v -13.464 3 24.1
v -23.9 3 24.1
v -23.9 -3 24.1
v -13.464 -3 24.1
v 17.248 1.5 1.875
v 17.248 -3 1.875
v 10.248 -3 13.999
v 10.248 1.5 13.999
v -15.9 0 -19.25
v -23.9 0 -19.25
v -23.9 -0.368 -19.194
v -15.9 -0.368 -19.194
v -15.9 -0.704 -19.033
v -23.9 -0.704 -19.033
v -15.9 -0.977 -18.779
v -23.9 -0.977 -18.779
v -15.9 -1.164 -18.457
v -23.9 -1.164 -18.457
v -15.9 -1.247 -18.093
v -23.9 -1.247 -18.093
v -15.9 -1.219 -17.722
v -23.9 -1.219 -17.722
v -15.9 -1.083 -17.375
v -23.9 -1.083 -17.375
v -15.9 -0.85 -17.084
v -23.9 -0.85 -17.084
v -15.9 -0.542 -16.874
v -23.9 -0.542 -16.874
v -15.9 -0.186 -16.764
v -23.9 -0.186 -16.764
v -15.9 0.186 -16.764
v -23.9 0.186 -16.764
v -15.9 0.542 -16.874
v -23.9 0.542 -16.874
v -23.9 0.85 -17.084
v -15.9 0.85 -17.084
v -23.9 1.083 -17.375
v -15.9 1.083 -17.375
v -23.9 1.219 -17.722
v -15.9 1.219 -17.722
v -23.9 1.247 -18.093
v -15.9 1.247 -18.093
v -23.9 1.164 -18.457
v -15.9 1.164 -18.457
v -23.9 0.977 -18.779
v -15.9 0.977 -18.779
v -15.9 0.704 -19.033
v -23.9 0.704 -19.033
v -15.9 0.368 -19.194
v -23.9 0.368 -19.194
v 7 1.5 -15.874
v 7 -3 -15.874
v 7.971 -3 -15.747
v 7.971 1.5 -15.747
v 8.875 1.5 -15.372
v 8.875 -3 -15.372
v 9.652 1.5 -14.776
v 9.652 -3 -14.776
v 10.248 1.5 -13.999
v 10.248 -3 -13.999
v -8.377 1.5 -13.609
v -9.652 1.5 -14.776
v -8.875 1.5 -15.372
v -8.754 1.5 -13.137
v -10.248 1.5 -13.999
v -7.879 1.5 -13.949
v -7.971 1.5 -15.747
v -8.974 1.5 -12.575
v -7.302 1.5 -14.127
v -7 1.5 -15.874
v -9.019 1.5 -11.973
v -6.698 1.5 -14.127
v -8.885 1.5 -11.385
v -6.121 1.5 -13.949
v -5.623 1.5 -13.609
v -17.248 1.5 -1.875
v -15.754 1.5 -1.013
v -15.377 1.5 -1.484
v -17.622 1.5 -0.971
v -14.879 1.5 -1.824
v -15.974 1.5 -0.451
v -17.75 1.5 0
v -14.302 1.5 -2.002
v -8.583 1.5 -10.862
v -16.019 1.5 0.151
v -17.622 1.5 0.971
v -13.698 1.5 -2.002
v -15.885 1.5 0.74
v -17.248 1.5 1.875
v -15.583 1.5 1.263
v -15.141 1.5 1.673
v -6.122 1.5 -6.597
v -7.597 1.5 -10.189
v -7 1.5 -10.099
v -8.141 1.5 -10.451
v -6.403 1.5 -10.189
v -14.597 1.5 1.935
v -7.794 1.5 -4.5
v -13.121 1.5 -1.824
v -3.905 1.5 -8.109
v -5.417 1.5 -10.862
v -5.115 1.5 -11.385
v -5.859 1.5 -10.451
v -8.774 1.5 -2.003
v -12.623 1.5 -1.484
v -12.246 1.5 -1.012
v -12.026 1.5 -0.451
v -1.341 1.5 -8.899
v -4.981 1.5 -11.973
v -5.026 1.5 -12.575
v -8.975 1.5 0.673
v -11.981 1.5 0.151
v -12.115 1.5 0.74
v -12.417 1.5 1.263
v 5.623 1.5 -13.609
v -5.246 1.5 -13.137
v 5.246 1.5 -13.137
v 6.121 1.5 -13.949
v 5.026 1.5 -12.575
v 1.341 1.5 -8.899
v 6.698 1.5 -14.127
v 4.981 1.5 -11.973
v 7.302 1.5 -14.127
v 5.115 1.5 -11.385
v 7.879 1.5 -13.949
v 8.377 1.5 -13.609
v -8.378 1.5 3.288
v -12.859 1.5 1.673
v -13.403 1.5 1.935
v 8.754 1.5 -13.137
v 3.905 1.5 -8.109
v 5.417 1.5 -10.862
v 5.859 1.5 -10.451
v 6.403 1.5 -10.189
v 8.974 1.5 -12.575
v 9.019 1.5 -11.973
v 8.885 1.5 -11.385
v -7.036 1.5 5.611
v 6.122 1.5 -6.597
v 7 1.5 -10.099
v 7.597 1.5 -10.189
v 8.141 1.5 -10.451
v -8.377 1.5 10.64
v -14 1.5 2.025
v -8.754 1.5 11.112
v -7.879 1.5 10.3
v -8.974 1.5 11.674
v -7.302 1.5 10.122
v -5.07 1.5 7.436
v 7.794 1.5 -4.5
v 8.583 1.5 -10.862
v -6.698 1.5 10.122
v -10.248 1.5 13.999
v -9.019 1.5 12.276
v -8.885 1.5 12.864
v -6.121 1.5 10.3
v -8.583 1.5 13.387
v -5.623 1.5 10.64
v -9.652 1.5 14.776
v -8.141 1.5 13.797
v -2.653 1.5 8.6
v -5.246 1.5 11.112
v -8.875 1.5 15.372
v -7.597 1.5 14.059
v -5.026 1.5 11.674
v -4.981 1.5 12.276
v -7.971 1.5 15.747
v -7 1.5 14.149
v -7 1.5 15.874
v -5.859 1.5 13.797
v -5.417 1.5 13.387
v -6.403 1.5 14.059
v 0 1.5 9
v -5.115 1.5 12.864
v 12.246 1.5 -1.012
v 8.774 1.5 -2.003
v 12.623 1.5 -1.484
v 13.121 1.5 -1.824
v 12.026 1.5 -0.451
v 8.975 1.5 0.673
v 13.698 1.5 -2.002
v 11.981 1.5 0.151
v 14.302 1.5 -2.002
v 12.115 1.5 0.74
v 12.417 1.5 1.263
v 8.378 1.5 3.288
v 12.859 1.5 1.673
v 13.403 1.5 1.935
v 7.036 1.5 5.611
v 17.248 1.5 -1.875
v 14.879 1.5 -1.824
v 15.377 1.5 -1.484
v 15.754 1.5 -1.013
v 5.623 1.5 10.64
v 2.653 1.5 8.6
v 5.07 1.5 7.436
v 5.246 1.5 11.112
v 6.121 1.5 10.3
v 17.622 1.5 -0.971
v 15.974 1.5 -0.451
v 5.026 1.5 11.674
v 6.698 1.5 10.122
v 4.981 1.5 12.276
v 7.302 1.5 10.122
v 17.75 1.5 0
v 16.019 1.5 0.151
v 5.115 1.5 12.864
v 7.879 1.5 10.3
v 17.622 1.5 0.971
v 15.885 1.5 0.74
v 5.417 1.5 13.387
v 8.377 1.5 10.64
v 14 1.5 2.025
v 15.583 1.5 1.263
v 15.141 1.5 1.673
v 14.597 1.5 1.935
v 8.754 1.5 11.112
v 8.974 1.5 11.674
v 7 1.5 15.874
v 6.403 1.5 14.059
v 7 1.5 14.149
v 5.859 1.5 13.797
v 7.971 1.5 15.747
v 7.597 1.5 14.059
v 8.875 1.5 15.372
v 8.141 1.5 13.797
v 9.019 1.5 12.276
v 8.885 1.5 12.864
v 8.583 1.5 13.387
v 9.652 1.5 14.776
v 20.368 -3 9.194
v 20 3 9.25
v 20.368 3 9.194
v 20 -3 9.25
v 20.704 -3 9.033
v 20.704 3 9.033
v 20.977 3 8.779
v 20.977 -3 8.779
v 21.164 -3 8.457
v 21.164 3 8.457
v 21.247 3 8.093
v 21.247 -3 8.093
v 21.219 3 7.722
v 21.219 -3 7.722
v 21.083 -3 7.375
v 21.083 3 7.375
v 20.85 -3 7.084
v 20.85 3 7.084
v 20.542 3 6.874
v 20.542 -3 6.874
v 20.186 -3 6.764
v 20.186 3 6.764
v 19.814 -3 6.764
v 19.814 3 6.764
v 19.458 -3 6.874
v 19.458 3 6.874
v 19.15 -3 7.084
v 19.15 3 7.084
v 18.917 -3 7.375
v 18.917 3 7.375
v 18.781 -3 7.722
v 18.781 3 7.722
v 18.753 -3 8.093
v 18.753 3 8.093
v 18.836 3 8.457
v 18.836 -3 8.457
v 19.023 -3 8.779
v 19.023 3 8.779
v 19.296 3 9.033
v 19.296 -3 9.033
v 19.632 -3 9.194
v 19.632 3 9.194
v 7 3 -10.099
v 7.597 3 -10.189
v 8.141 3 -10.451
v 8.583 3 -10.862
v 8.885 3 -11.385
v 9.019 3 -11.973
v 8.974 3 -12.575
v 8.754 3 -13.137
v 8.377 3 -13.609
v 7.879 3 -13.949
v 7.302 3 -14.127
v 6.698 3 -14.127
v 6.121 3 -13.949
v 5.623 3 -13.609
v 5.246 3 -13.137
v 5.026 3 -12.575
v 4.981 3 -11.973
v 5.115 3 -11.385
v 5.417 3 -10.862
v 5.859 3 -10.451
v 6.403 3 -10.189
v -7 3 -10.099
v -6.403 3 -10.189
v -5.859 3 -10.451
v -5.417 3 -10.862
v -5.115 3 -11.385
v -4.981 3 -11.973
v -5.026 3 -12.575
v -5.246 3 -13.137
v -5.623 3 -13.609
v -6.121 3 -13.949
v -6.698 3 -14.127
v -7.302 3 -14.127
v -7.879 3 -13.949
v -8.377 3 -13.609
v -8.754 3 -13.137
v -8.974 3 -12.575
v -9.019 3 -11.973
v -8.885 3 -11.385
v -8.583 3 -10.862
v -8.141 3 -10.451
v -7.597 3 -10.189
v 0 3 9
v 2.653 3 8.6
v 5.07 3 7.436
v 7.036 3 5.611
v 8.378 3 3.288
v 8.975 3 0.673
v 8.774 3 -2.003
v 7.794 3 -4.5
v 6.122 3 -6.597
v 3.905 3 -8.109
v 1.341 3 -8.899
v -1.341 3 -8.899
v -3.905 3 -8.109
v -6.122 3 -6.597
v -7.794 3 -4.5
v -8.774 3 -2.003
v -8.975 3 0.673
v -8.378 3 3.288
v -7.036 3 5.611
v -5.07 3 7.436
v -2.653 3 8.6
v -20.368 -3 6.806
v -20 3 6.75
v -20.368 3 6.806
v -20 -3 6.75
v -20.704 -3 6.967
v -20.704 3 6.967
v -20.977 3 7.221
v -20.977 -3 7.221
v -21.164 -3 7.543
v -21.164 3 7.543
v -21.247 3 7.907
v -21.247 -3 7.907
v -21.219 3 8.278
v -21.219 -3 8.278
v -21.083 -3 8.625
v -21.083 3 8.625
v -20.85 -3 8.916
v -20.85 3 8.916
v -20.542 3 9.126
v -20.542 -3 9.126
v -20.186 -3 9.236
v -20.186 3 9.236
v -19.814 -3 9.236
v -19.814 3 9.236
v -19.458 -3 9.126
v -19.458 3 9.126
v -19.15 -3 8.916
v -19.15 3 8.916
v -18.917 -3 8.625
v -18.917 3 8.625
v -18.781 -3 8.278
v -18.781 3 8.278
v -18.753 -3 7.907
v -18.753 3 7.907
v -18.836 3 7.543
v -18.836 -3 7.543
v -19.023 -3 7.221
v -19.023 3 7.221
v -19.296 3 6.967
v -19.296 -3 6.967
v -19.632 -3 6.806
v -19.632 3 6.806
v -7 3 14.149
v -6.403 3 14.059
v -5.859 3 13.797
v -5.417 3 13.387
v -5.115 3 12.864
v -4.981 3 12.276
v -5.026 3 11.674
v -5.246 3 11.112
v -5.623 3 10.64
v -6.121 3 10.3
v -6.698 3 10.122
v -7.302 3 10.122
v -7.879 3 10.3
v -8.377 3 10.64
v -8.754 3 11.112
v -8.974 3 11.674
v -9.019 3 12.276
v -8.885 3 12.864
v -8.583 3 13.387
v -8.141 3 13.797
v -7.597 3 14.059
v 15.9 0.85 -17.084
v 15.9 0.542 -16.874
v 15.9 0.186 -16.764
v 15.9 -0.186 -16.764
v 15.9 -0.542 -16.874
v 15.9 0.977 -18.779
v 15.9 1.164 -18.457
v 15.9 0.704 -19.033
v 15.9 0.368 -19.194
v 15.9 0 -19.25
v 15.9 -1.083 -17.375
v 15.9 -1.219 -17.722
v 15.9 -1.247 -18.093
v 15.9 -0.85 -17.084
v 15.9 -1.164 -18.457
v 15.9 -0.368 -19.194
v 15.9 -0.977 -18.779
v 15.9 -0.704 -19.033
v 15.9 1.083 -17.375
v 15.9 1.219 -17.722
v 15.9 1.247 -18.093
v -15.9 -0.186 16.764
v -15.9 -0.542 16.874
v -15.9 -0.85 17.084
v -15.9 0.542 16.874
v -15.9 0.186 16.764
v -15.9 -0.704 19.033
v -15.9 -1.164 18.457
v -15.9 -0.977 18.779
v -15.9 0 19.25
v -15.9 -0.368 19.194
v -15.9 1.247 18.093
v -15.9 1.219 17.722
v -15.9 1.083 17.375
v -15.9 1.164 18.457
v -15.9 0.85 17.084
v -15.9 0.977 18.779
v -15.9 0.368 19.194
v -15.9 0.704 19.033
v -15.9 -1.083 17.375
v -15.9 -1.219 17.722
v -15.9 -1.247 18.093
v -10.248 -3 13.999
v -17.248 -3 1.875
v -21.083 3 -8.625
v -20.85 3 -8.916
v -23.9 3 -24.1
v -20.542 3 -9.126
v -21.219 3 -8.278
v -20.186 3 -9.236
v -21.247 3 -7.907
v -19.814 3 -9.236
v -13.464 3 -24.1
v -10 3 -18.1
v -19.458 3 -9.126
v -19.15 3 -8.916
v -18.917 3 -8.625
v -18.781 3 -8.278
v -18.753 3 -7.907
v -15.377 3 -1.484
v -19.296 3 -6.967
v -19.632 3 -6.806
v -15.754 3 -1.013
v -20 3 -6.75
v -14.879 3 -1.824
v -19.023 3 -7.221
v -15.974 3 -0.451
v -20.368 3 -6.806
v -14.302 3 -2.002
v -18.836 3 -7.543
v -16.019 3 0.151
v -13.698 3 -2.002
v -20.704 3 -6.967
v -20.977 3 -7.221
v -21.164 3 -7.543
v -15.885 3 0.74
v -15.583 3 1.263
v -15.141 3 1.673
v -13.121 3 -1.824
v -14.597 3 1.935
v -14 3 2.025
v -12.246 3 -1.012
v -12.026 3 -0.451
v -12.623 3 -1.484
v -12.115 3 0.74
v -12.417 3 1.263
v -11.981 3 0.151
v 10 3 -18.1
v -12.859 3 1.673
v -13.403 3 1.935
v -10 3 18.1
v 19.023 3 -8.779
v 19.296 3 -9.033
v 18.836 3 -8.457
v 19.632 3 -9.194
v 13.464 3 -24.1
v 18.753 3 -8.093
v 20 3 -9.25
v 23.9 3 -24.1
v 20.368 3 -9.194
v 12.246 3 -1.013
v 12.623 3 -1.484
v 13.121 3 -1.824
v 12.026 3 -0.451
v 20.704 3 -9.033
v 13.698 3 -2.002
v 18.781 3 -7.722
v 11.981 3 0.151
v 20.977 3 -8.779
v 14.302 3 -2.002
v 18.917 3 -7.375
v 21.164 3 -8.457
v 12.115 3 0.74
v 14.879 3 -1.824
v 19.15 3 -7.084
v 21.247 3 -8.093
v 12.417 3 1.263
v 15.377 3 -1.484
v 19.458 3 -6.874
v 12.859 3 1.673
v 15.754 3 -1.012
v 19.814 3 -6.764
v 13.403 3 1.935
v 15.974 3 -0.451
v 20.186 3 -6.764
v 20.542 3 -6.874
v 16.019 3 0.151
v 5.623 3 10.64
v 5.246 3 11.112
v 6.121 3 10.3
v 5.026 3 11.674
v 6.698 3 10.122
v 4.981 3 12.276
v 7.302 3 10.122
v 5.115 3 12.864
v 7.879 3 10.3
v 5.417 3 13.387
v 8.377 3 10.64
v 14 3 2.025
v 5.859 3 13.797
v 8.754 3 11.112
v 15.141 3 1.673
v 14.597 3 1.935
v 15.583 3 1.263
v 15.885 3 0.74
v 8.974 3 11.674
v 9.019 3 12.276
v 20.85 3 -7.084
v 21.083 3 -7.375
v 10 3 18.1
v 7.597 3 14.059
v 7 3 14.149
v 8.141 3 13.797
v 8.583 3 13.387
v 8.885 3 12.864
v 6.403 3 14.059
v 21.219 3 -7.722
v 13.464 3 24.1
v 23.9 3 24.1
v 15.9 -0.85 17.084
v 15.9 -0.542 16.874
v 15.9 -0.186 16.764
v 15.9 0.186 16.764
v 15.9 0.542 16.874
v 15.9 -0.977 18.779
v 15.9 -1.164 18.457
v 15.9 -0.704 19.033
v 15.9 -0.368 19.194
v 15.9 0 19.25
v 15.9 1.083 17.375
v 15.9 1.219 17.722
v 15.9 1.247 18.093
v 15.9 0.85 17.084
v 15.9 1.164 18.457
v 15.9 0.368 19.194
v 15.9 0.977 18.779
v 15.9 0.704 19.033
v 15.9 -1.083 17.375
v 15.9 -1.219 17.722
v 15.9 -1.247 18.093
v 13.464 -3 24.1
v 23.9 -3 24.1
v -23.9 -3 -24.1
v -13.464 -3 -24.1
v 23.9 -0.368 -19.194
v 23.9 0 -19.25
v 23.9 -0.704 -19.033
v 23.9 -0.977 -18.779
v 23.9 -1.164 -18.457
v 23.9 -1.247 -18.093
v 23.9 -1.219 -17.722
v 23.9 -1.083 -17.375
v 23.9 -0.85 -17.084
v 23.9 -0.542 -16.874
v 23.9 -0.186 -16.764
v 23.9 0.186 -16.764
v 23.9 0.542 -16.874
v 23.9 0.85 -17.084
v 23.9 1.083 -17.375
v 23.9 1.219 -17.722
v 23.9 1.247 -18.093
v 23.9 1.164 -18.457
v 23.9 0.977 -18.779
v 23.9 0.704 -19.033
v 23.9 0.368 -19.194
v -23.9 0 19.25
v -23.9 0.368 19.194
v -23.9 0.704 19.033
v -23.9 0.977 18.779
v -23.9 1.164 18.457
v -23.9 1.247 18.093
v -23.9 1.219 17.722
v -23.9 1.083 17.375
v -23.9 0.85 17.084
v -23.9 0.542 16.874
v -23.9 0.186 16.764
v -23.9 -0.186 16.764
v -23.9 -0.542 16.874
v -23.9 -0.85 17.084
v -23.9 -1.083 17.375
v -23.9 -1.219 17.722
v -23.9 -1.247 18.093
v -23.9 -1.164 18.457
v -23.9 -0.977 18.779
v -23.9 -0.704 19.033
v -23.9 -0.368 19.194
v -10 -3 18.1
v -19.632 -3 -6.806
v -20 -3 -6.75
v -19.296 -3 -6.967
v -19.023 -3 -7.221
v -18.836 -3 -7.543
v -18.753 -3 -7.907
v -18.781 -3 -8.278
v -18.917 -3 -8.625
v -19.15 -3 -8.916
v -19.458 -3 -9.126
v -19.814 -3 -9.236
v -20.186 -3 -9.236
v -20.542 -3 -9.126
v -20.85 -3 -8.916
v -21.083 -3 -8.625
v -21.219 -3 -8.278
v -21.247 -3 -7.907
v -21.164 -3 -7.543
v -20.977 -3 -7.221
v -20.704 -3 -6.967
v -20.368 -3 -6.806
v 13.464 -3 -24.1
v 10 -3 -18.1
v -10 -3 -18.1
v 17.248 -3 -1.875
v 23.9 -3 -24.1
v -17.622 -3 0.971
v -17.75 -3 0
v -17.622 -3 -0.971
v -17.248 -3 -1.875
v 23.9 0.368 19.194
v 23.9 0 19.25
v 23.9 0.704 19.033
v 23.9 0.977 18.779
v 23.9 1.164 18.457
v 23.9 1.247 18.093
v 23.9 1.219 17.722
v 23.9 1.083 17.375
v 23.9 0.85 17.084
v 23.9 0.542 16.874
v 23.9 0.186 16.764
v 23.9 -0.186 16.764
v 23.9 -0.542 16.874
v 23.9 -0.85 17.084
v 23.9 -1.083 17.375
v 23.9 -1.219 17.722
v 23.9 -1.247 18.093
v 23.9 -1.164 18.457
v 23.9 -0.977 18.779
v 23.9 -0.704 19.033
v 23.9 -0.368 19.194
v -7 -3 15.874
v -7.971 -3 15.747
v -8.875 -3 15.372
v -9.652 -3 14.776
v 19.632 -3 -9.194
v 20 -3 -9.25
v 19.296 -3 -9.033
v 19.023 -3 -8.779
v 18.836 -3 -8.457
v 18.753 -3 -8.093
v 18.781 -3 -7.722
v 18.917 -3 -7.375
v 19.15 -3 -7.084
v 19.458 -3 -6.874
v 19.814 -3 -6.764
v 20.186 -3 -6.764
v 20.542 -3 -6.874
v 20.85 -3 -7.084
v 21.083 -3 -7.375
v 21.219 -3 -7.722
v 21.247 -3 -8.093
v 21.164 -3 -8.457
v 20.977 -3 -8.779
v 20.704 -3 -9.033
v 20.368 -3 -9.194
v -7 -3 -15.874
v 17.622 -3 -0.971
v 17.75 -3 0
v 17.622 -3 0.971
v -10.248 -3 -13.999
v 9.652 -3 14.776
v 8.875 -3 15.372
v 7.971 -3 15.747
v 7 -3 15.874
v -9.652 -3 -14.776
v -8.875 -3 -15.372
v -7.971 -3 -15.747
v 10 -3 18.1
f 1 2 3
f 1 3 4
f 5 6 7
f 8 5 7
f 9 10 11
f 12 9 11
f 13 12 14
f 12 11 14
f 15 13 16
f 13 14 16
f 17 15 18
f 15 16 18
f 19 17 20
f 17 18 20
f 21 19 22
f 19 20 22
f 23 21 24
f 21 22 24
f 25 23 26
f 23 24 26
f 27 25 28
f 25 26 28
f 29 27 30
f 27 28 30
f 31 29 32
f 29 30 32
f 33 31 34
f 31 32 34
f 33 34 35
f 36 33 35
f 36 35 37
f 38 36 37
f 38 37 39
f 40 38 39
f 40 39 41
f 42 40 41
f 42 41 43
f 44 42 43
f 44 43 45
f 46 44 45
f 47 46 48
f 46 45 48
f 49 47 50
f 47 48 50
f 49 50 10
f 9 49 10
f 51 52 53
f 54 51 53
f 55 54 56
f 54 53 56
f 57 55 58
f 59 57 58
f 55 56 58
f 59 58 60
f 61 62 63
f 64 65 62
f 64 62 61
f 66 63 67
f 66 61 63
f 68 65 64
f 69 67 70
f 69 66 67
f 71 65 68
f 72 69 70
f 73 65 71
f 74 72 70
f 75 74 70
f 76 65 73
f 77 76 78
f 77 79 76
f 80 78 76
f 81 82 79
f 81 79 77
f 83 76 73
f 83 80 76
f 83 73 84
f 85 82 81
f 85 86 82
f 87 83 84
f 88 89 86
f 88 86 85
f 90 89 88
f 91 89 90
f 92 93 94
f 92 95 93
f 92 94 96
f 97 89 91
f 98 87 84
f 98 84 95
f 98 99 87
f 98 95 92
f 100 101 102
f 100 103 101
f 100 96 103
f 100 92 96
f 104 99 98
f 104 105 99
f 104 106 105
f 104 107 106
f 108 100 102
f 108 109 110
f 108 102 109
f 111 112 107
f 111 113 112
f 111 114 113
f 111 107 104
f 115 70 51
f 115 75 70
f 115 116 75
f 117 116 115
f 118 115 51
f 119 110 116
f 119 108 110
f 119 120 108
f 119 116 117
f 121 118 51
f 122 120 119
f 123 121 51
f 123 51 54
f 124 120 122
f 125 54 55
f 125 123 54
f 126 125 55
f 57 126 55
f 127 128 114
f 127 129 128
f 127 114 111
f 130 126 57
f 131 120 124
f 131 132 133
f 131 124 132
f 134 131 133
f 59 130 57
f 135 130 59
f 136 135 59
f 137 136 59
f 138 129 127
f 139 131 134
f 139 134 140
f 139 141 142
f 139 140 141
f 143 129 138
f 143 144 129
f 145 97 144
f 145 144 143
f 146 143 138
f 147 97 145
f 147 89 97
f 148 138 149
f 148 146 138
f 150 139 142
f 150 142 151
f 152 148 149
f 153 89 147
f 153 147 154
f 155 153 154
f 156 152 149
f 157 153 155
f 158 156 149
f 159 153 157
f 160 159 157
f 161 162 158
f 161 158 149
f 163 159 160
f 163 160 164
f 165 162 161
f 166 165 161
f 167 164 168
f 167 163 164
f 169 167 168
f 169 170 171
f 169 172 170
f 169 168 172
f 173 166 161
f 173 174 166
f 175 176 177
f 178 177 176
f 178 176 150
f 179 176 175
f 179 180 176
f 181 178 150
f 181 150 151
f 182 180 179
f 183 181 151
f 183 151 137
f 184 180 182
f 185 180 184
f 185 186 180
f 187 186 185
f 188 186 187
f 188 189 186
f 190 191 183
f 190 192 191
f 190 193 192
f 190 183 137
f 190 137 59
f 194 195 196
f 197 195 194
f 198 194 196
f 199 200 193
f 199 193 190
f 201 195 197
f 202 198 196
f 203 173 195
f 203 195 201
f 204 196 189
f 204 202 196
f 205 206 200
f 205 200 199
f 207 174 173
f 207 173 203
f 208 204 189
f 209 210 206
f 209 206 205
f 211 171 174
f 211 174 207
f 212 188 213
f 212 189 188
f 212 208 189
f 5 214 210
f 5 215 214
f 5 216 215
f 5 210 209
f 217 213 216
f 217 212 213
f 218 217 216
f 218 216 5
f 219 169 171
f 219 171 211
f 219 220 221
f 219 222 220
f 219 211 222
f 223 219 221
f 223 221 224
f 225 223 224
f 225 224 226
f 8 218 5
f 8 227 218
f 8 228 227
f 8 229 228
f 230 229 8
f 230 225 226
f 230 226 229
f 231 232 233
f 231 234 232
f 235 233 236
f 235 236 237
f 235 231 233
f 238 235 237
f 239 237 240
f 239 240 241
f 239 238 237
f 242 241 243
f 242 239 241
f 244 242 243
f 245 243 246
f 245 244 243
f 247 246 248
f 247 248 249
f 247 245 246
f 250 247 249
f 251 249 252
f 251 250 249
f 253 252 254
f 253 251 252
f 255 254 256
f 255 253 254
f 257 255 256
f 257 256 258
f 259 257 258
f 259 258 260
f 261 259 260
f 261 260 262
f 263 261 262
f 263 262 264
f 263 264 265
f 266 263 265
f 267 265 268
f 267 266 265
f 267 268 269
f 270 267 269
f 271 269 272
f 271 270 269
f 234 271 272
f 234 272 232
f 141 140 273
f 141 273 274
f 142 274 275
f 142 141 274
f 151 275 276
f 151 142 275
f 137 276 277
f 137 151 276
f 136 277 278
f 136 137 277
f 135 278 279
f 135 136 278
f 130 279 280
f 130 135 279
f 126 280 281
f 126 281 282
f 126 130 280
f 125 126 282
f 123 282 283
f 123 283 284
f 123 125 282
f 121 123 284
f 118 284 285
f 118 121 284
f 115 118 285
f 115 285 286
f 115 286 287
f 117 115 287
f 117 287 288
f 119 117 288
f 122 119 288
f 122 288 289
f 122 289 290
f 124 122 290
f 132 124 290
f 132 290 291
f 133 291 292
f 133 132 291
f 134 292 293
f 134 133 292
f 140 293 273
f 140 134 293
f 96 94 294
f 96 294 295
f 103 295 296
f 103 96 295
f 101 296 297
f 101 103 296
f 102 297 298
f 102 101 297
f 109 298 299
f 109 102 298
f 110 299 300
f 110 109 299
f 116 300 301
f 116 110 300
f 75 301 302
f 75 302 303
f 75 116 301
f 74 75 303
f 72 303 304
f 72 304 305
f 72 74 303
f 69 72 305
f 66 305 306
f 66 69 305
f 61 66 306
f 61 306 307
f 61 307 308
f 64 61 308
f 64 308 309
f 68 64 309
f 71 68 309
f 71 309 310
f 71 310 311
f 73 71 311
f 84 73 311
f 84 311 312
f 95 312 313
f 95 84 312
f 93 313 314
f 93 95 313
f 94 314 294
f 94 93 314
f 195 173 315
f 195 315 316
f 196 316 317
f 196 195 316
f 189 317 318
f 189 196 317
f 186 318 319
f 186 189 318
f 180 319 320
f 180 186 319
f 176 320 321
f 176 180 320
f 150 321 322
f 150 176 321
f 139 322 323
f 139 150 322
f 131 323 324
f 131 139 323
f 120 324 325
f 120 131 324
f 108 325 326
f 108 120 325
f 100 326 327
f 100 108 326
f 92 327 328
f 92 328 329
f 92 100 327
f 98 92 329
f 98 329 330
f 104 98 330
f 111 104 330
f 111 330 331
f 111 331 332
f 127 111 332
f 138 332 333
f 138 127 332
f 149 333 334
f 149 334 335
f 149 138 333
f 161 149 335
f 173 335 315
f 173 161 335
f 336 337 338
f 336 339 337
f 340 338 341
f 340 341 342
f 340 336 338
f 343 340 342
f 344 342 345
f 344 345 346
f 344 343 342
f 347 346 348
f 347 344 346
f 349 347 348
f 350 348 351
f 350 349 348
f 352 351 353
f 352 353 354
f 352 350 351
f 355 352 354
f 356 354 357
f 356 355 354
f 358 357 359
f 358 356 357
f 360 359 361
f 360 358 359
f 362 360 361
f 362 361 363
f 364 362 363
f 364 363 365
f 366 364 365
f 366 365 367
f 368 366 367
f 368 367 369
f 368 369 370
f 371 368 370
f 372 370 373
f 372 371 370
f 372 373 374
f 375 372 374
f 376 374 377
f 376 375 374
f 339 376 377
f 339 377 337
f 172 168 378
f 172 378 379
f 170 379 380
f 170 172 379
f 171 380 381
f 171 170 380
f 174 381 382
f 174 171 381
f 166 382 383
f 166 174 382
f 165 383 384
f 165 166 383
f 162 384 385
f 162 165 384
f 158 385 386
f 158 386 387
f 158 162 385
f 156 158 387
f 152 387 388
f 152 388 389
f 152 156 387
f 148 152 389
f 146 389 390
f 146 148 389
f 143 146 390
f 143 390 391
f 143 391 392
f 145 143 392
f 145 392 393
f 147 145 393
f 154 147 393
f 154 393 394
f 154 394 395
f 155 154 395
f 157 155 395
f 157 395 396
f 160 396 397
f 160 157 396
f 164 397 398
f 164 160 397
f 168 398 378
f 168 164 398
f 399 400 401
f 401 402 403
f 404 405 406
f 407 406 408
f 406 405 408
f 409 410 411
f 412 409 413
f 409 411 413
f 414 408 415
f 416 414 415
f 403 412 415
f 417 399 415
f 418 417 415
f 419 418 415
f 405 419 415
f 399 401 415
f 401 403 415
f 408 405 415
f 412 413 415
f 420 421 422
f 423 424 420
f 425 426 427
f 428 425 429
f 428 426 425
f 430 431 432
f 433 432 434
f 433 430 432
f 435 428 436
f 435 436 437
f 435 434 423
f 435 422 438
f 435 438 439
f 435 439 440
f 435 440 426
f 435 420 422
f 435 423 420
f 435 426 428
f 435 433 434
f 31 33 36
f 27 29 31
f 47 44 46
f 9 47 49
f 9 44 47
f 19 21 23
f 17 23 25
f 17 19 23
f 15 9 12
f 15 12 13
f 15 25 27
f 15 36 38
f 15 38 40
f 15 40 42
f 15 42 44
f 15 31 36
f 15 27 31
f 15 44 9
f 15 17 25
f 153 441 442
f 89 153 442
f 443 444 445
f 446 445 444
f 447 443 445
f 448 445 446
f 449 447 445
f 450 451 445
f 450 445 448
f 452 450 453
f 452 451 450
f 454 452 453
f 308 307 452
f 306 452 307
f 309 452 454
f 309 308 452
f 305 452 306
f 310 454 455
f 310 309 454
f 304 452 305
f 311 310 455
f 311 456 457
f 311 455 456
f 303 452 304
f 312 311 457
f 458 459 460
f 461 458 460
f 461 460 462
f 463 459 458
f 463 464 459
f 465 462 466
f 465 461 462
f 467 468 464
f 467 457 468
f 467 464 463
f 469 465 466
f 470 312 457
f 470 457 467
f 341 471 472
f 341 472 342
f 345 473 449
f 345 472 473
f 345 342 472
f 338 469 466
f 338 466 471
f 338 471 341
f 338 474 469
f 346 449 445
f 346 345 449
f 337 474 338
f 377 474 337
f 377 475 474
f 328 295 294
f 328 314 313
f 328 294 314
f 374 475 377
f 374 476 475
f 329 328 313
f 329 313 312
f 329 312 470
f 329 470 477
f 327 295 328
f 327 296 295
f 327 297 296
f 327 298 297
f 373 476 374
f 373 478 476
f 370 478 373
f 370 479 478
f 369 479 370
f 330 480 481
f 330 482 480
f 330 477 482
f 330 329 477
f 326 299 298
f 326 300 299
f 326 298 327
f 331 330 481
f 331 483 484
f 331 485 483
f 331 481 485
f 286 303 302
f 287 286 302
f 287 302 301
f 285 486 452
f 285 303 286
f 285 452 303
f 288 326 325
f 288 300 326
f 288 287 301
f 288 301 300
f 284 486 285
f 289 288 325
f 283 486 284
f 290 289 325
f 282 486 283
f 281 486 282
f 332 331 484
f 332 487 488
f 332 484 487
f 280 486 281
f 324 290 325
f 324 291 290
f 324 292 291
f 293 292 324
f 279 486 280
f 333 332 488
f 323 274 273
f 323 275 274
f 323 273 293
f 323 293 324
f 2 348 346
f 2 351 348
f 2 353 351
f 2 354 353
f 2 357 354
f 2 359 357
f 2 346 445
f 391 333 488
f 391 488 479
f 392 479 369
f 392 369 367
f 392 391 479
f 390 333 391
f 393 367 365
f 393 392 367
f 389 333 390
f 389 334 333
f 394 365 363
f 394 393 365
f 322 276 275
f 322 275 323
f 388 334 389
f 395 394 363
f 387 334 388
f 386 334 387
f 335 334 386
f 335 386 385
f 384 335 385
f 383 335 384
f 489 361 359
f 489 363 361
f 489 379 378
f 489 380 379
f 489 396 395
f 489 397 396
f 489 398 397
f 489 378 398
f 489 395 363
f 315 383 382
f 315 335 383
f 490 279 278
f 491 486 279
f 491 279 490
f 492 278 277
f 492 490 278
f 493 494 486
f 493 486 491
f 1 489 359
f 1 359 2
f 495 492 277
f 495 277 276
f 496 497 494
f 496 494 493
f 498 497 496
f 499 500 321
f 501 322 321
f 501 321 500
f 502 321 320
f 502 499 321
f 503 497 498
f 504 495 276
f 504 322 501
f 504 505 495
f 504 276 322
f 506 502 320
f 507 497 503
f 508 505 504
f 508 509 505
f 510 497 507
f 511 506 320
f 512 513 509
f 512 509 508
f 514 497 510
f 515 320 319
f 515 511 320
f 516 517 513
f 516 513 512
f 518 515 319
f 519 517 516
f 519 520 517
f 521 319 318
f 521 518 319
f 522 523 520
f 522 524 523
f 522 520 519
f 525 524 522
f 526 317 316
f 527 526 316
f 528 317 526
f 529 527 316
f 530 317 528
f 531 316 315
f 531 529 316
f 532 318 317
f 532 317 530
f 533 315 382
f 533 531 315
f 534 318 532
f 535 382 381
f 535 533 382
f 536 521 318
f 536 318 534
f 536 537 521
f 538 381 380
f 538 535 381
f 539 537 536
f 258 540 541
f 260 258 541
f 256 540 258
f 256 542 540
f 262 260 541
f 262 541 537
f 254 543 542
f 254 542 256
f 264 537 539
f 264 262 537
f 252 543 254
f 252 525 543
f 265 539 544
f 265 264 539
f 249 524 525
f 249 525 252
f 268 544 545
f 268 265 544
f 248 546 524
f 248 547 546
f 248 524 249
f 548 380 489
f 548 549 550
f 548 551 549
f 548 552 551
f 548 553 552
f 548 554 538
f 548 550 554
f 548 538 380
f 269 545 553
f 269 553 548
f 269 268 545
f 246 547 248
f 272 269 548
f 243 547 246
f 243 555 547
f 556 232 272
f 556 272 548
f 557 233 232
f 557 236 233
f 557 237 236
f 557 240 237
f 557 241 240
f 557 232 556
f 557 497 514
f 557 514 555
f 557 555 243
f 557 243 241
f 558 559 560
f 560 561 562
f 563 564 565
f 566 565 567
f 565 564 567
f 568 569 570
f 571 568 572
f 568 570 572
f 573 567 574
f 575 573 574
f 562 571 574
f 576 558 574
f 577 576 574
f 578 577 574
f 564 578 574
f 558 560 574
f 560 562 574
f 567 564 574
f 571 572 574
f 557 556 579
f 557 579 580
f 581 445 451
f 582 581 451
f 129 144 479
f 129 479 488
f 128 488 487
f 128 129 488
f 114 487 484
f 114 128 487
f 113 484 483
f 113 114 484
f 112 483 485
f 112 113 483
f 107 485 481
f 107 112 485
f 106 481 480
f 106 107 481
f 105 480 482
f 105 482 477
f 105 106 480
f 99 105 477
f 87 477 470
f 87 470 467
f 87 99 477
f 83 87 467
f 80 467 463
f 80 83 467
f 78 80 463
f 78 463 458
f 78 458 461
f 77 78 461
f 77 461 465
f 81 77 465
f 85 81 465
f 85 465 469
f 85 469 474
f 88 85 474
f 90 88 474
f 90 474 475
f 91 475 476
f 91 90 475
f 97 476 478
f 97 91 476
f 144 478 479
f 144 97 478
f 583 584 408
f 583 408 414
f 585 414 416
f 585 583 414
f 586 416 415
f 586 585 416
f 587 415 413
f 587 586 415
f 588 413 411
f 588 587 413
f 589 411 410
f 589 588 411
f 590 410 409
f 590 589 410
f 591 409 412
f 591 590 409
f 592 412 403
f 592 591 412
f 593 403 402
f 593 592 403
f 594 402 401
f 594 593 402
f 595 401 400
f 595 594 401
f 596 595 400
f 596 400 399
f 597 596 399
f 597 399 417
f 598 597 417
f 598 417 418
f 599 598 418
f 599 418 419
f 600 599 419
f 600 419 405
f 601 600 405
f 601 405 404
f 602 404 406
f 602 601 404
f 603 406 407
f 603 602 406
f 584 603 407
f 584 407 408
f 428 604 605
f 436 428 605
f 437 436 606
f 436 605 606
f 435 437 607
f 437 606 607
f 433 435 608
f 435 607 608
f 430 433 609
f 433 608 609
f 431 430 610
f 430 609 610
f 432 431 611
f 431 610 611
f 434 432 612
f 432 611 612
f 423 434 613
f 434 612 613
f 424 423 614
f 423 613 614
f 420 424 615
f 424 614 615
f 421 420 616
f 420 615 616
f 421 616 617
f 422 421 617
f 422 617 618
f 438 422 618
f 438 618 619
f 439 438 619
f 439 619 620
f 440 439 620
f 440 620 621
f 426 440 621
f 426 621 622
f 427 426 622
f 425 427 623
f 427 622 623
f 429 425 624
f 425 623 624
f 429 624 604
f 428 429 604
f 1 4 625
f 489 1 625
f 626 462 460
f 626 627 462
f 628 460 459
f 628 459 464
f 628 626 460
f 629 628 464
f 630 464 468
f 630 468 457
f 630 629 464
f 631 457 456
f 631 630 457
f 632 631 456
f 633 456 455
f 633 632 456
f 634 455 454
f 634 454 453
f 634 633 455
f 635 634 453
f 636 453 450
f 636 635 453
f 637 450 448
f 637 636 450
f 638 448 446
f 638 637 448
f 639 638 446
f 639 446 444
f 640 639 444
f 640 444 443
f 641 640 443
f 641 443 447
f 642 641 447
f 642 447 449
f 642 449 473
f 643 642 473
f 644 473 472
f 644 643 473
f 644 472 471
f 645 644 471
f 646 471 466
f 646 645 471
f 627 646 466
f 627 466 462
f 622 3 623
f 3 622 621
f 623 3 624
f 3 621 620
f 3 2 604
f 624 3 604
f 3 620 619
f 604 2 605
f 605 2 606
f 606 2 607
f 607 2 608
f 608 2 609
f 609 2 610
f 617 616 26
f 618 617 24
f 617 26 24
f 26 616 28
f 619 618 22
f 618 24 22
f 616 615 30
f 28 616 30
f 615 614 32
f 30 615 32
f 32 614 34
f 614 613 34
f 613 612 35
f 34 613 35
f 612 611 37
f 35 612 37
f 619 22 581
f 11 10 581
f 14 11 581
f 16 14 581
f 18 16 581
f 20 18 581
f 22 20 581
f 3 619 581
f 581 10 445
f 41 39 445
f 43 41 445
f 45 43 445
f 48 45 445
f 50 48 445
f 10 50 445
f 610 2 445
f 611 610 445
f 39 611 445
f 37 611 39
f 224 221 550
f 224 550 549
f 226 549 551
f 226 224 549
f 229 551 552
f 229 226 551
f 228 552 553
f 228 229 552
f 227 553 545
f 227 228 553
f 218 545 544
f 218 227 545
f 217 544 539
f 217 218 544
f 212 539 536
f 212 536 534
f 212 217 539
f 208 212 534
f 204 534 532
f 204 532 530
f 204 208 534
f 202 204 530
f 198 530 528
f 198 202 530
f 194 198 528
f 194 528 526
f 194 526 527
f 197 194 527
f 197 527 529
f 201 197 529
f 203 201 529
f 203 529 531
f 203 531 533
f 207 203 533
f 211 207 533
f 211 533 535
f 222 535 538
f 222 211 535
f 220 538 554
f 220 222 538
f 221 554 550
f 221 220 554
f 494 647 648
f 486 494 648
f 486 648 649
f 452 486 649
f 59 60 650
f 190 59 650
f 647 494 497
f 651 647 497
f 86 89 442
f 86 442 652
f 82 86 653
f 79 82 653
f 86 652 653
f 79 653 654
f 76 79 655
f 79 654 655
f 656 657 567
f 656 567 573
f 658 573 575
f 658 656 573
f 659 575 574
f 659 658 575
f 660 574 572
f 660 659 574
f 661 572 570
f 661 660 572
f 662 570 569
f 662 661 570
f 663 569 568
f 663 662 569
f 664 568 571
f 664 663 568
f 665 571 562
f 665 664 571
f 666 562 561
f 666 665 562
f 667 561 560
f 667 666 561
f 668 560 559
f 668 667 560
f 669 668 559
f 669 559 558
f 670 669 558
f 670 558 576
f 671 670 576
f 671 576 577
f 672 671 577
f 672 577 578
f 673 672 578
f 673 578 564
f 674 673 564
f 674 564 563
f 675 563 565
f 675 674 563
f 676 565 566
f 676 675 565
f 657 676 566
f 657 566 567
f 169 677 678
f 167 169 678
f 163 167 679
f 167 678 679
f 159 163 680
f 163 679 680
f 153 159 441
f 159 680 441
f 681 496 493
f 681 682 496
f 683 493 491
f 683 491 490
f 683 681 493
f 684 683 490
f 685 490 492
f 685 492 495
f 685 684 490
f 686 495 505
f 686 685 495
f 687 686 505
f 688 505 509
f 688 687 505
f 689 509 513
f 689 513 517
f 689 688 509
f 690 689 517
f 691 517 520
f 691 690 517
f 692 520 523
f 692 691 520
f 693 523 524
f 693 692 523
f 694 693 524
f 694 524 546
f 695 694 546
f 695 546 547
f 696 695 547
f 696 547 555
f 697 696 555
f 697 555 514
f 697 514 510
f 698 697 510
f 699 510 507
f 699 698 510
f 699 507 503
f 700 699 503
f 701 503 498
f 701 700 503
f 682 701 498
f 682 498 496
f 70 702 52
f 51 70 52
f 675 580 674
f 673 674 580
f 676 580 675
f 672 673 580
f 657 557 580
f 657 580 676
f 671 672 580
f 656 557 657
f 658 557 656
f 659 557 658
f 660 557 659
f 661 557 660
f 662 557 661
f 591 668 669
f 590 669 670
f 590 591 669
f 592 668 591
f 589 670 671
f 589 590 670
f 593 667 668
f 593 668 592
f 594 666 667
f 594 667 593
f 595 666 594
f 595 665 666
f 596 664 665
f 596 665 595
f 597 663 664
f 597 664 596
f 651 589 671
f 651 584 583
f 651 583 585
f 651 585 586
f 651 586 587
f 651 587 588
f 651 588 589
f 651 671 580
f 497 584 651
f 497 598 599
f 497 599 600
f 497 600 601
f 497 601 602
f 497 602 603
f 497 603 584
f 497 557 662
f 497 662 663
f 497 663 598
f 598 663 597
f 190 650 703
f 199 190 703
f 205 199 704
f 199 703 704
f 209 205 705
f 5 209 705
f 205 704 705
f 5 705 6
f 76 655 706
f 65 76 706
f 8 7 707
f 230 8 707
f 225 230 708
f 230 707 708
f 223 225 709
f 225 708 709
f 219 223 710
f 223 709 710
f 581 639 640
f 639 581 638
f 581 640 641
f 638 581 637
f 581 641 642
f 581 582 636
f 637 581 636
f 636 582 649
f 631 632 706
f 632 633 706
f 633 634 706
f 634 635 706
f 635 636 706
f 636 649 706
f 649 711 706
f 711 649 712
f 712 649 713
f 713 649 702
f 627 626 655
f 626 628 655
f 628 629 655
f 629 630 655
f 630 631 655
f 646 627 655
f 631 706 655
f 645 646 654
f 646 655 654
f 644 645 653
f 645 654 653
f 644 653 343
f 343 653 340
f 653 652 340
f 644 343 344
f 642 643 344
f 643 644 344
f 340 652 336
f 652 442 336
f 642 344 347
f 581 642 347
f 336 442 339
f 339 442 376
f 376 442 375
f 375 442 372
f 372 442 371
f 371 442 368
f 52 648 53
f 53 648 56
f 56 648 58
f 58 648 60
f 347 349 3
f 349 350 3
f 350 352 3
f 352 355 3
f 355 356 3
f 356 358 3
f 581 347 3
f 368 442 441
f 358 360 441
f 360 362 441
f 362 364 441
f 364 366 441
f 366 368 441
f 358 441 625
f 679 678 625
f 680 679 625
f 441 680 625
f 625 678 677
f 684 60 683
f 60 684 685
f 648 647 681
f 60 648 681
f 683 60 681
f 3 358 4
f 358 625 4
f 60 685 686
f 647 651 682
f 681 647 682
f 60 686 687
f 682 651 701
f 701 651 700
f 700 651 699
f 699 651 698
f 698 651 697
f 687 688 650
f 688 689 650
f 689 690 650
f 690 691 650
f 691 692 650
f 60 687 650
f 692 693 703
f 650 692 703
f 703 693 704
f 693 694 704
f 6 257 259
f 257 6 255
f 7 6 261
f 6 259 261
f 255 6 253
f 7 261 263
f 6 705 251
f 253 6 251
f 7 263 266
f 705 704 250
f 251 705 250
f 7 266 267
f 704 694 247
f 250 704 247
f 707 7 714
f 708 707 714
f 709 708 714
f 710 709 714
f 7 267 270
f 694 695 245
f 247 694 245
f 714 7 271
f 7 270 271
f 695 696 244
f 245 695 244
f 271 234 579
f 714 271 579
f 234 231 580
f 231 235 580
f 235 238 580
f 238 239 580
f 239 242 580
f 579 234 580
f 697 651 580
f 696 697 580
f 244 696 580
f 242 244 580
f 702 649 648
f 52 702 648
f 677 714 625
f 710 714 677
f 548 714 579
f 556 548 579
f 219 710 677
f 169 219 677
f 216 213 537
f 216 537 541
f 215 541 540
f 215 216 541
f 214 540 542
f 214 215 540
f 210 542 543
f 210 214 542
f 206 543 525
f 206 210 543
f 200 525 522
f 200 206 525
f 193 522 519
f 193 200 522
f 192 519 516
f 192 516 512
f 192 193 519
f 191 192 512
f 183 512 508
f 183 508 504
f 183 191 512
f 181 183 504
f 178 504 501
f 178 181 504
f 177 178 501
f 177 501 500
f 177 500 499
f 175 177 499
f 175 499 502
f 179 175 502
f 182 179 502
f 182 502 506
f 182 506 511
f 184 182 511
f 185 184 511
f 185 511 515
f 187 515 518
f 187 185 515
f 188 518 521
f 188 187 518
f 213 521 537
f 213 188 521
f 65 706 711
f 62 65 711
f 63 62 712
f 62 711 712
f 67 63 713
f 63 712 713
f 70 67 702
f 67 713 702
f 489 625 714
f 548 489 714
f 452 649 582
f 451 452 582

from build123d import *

# Parameters (mm, degrees)
SKETCH_1_R          = 35
SKETCH_1_R_2        = 2.025
SKETCH_1_R_3        = 9
SKETCH_1_R_4        = 1.25
EXTRUDE_1_DEPTH     = 3
CUT_EXTRUDE_1_REACH = 51.86
SKETCH_2_R          = 35
SKETCH_2_W          = 47.8
SKETCH_2_H          = 48.2
SKETCH_3_R          = 1.25
CUT_EXTRUDE_2_DEPTH = 8
SKETCH_5_R          = 9
SKETCH_5_R_2        = 3.75
SKETCH_5_R_3        = 2.025
CUT_EXTRUDE_4_DEPTH = 4.5
CUT_EXTRUDE_6_DEPTH = 35.467666007


with BuildPart() as part:
    # 草图1 → 凸台-拉伸1 (new, symmetric)
    with BuildSketch(Plane(origin=(0, 0, 0), x_dir=(1, 0, 0), z_dir=(0, 1, 0))):
        with Locations(Location((0, 0, 0), (0, 0, 270))):
            Circle(SKETCH_1_R)
        with Locations(Location((14, 0, 0), (0, 0, 270))):
            Circle(SKETCH_1_R_2, mode=Mode.SUBTRACT)
        with Locations(Location((7, -12.124355653, 0), (0, 0, 270))):
            Circle(SKETCH_1_R_2, mode=Mode.SUBTRACT)
        with Locations(Location((-7, -12.124355653, 0), (0, 0, 270))):
            Circle(SKETCH_1_R_2, mode=Mode.SUBTRACT)
        with Locations(Location((-14, 0, 0), (0, 0, 270))):
            Circle(SKETCH_1_R_2, mode=Mode.SUBTRACT)
        with Locations(Location((-7, 12.124355653, 0), (0, 0, 270))):
            Circle(SKETCH_1_R_2, mode=Mode.SUBTRACT)
        with Locations(Location((7, 12.124355653, 0), (0, 0, 270))):
            Circle(SKETCH_1_R_2, mode=Mode.SUBTRACT)
        with Locations(Location((0, 0, 0), (0, 0, 270))):
            Circle(SKETCH_1_R_3, mode=Mode.SUBTRACT)
        with Locations(Location((-20, 8, 0), (0, 0, 270))):
            Circle(SKETCH_1_R_4, mode=Mode.SUBTRACT)
        with Locations(Location((-20, -8, 0), (0, 0, 90))):
            Circle(SKETCH_1_R_4, mode=Mode.SUBTRACT)
        with Locations(Location((20, -8, 0), (0, 0, 270))):
            Circle(SKETCH_1_R_4, mode=Mode.SUBTRACT)
        with Locations(Location((20, 8, 0), (0, 0, 90))):
            Circle(SKETCH_1_R_4, mode=Mode.SUBTRACT)
    extrude(amount=EXTRUDE_1_DEPTH, both=True)

    # 草图2 → 切除-拉伸1 (cut, up to next)
    with BuildSketch(Plane(origin=(0, 3, 0), x_dir=(1, 0, 0), z_dir=(0, 1, 0)), mode=Mode.PRIVATE) as cut_extrude_1_sk1:
        Circle(SKETCH_2_R)
        Rectangle(SKETCH_2_W, SKETCH_2_H, mode=Mode.SUBTRACT)
    cut_extrude_1_tool1 = extrude(cut_extrude_1_sk1.sketch, amount=-CUT_EXTRUDE_1_REACH, mode=Mode.PRIVATE) & part.part
    add(cut_extrude_1_tool1.solids().sort_by_distance((-34.010051, 3, 0))[0], mode=Mode.SUBTRACT)

    # 草图3 → 切除-拉伸2 (cut)
    with BuildSketch(Plane.ZY.offset(23.9)):
        with Locations((18, 0)):
            Circle(SKETCH_3_R)
        with Locations(Location((-18, 0, 0), (0, 0, 180))):
            Circle(SKETCH_3_R)
    cut_extrude_2 = extrude(amount=-CUT_EXTRUDE_2_DEPTH, mode=Mode.SUBTRACT)

    # 草图5 → 切除-拉伸4 (cut)
    # profile 1 of 7: a face of its own
    with BuildSketch(Plane.XZ.offset(3)):
        with BuildLine():
            Line((7, 15.874355653), (-7, 15.874355653))
            ThreePointArc((-7, 15.874355653), (-4.348349571, 14.776006082), (-3.25, 12.124355653))
            ThreePointArc((-3.25, 12.124355653), (-7.970571419, 8.502133804), (-10.247595264, 13.999355653))
            Line((-10.247595264, 13.999355653), (-17.247595264, 1.875))
            ThreePointArc((-17.247595264, 1.875), (-13.029428581, 3.622221849), (-10.25, 0))
            ThreePointArc((-10.25, 0), (-13.029428581, -3.622221849), (-17.247595264, -1.875))
            Line((-17.247595264, -1.875), (-10.247595264, -13.999355653))
            ThreePointArc((-10.247595264, -13.999355653), (-7.970571419, -8.502133804), (-3.25, -12.124355653))
            ThreePointArc((-3.25, -12.124355653), (-4.348349571, -14.776006082), (-7, -15.874355653))
            Line((-7, -15.874355653), (7, -15.874355653))
            ThreePointArc((7, -15.874355653), (4.348349571, -9.472705224), (10.75, -12.124355653))
            ThreePointArc((10.75, -12.124355653), (10.622221849, -13.094927072), (10.247595264, -13.999355653))
            Line((10.247595264, -13.999355653), (17.247595264, -1.875))
            ThreePointArc((17.247595264, -1.875), (10.25, 0), (17.247595264, 1.875))
            Line((17.247595264, 1.875), (10.247595264, 13.999355653))
            ThreePointArc((10.247595264, 13.999355653), (10.622221849, 13.094927072), (10.75, 12.124355653))
            ThreePointArc((10.75, 12.124355653), (4.348349571, 9.472705224), (7, 15.874355653))
        make_face()
        with Locations(Location((0, 0, 0), (0, 0, 270))):
            Circle(SKETCH_5_R, mode=Mode.SUBTRACT)
    # profile 2 of 7: a face of its own
    with BuildSketch(Plane.XZ.offset(3)):
        with Locations((-14, 0)):
            Circle(SKETCH_5_R_2)
        with Locations(Location((-14, 0, 0), (0, 0, 270))):
            Circle(SKETCH_5_R_3, mode=Mode.SUBTRACT)
    # profile 3 of 7: a face of its own
    with BuildSketch(Plane.XZ.offset(3)):
        with Locations((-7, 12.124355653)):
            Circle(SKETCH_5_R_2)
        with Locations(Location((-7, 12.124355653, 0), (0, 0, 270))):
            Circle(SKETCH_5_R_3, mode=Mode.SUBTRACT)
    # profile 4 of 7: a face of its own
    with BuildSketch(Plane.XZ.offset(3)):
        with Locations((7, 12.124355653)):
            Circle(SKETCH_5_R_2)
        with Locations(Location((7, 12.124355653, 0), (0, 0, 270))):
            Circle(SKETCH_5_R_3, mode=Mode.SUBTRACT)
    # profile 5 of 7: a face of its own
    with BuildSketch(Plane.XZ.offset(3)):
        with Locations((14, 0)):
            Circle(SKETCH_5_R_2)
        with Locations(Location((14, 0, 0), (0, 0, 270))):
            Circle(SKETCH_5_R_3, mode=Mode.SUBTRACT)
    # profile 6 of 7: a face of its own
    with BuildSketch(Plane.XZ.offset(3)):
        with Locations((7, -12.124355653)):
            Circle(SKETCH_5_R_2)
        with Locations(Location((7, -12.124355653, 0), (0, 0, 270))):
            Circle(SKETCH_5_R_3, mode=Mode.SUBTRACT)
    # profile 7 of 7: a face of its own
    with BuildSketch(Plane.XZ.offset(3)):
        with Locations((-7, -12.124355653)):
            Circle(SKETCH_5_R_2)
        with Locations(Location((-7, -12.124355653, 0), (0, 0, 270))):
            Circle(SKETCH_5_R_3, mode=Mode.SUBTRACT)
    extrude(amount=-CUT_EXTRUDE_4_DEPTH, mode=Mode.SUBTRACT)

    # 镜向1: 切除-拉伸2 across plane
    add(cut_extrude_2.mirror(Plane(origin=(0, 0, 0), x_dir=(0, 0, 1), z_dir=(1, 0, 0))), mode=Mode.SUBTRACT)

    # 草图7 → 切除-拉伸6 (cut, through all)
    with BuildSketch(Plane.XZ.offset(3)):
        Polygon((-13.464101615, 24.1), (-10, 18.1), (10, 18.1), (13.464101615, 24.1), align=None)
        Polygon((10, -18.1), (-10, -18.1), (-13.464101615, -24.1), (13.464101615, -24.1), align=None)
    extrude(amount=-CUT_EXTRUDE_6_DEPTH, mode=Mode.SUBTRACT)


solid = part.part
